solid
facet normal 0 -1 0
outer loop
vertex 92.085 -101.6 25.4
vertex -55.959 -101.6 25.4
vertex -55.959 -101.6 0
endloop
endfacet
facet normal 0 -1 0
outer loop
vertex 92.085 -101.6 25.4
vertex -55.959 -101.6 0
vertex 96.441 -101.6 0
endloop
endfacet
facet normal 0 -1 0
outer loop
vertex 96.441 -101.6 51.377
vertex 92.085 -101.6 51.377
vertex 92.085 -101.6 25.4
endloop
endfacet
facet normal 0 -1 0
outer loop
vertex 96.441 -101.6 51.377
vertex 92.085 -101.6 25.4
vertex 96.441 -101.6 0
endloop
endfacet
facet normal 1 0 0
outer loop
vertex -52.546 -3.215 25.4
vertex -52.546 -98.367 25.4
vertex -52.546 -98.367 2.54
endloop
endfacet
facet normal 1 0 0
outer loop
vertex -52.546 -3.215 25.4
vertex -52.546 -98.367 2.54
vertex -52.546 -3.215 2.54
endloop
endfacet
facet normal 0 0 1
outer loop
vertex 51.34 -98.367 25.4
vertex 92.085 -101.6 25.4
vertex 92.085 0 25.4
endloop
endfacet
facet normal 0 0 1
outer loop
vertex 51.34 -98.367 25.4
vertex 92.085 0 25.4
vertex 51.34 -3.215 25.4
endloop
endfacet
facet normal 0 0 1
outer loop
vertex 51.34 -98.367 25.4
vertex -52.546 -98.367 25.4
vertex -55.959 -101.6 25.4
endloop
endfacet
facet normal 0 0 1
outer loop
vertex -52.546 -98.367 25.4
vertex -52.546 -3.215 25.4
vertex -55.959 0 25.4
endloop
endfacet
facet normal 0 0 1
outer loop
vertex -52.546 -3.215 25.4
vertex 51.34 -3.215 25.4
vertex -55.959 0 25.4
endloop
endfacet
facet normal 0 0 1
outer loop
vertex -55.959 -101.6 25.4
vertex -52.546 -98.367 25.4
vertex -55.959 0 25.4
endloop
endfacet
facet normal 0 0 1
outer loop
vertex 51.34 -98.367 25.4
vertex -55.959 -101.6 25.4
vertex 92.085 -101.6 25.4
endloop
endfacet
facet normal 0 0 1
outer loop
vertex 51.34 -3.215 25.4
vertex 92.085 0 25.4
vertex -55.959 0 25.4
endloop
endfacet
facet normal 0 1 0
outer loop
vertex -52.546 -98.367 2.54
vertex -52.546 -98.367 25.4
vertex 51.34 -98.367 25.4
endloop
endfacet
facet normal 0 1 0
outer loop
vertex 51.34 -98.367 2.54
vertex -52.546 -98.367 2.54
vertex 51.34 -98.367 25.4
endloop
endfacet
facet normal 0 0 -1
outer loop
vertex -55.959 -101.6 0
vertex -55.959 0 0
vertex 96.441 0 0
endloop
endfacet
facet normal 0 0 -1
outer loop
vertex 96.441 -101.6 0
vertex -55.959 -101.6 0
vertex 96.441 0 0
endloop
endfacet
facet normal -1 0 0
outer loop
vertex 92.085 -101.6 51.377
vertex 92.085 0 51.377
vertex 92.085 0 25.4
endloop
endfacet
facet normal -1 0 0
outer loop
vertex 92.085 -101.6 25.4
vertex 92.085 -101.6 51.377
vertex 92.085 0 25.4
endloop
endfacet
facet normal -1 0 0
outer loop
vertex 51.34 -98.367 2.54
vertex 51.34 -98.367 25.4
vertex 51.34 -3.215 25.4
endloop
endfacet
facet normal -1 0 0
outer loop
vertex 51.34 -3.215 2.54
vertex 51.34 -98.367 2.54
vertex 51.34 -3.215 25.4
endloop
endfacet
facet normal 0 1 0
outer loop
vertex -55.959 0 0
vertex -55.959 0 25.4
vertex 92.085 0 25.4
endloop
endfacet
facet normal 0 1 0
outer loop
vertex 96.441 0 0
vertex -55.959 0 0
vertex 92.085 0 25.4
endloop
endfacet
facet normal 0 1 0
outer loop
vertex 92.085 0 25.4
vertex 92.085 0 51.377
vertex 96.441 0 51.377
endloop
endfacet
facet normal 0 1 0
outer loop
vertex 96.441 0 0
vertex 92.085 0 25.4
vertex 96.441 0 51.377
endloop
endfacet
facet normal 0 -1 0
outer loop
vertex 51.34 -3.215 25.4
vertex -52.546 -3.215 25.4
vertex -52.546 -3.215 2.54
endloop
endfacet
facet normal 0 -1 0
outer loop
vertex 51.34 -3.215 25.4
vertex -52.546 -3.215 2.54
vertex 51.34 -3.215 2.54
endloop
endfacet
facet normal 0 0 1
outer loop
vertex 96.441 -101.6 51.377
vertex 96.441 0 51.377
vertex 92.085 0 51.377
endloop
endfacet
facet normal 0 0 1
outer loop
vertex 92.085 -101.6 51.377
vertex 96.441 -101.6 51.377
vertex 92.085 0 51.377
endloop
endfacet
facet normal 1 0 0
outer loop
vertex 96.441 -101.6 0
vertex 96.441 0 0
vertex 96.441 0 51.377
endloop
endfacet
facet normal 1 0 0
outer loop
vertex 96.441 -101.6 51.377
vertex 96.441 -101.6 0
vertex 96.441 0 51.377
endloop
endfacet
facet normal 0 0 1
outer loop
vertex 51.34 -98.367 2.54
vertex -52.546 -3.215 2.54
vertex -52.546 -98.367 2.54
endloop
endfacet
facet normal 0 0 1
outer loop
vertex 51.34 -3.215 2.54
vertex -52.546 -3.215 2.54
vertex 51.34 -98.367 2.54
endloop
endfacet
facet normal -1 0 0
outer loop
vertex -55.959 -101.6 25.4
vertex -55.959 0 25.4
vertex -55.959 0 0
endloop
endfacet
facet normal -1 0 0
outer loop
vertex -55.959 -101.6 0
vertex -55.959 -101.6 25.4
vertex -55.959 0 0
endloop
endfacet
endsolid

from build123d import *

# Parameters (mm, degrees)
F1_DEPTH = 101.6
F2_W     = 103.886
F2_H     = 95.151683
F3_DEPTH = 22.86


with BuildPart() as f1:
    # F0 (on Front) → F1 (new body)
    with BuildSketch(Plane.XZ):
        Polygon((-55.959374, 25.4), (-55.959374, 0), (96.440626, 0), (96.440626, 51.377271), (92.084546, 51.377271), (92.084546, 25.4), align=None)
    extrude(amount=F1_DEPTH)

    # F2 (on face) → F3 (cut)
    with BuildSketch(Plane.XY.offset(25.4)):
        with Locations((-0.603251, -50.790785)):
            Rectangle(F2_W, F2_H)
    extrude(amount=-F3_DEPTH, mode=Mode.SUBTRACT)


solid = f1.part
